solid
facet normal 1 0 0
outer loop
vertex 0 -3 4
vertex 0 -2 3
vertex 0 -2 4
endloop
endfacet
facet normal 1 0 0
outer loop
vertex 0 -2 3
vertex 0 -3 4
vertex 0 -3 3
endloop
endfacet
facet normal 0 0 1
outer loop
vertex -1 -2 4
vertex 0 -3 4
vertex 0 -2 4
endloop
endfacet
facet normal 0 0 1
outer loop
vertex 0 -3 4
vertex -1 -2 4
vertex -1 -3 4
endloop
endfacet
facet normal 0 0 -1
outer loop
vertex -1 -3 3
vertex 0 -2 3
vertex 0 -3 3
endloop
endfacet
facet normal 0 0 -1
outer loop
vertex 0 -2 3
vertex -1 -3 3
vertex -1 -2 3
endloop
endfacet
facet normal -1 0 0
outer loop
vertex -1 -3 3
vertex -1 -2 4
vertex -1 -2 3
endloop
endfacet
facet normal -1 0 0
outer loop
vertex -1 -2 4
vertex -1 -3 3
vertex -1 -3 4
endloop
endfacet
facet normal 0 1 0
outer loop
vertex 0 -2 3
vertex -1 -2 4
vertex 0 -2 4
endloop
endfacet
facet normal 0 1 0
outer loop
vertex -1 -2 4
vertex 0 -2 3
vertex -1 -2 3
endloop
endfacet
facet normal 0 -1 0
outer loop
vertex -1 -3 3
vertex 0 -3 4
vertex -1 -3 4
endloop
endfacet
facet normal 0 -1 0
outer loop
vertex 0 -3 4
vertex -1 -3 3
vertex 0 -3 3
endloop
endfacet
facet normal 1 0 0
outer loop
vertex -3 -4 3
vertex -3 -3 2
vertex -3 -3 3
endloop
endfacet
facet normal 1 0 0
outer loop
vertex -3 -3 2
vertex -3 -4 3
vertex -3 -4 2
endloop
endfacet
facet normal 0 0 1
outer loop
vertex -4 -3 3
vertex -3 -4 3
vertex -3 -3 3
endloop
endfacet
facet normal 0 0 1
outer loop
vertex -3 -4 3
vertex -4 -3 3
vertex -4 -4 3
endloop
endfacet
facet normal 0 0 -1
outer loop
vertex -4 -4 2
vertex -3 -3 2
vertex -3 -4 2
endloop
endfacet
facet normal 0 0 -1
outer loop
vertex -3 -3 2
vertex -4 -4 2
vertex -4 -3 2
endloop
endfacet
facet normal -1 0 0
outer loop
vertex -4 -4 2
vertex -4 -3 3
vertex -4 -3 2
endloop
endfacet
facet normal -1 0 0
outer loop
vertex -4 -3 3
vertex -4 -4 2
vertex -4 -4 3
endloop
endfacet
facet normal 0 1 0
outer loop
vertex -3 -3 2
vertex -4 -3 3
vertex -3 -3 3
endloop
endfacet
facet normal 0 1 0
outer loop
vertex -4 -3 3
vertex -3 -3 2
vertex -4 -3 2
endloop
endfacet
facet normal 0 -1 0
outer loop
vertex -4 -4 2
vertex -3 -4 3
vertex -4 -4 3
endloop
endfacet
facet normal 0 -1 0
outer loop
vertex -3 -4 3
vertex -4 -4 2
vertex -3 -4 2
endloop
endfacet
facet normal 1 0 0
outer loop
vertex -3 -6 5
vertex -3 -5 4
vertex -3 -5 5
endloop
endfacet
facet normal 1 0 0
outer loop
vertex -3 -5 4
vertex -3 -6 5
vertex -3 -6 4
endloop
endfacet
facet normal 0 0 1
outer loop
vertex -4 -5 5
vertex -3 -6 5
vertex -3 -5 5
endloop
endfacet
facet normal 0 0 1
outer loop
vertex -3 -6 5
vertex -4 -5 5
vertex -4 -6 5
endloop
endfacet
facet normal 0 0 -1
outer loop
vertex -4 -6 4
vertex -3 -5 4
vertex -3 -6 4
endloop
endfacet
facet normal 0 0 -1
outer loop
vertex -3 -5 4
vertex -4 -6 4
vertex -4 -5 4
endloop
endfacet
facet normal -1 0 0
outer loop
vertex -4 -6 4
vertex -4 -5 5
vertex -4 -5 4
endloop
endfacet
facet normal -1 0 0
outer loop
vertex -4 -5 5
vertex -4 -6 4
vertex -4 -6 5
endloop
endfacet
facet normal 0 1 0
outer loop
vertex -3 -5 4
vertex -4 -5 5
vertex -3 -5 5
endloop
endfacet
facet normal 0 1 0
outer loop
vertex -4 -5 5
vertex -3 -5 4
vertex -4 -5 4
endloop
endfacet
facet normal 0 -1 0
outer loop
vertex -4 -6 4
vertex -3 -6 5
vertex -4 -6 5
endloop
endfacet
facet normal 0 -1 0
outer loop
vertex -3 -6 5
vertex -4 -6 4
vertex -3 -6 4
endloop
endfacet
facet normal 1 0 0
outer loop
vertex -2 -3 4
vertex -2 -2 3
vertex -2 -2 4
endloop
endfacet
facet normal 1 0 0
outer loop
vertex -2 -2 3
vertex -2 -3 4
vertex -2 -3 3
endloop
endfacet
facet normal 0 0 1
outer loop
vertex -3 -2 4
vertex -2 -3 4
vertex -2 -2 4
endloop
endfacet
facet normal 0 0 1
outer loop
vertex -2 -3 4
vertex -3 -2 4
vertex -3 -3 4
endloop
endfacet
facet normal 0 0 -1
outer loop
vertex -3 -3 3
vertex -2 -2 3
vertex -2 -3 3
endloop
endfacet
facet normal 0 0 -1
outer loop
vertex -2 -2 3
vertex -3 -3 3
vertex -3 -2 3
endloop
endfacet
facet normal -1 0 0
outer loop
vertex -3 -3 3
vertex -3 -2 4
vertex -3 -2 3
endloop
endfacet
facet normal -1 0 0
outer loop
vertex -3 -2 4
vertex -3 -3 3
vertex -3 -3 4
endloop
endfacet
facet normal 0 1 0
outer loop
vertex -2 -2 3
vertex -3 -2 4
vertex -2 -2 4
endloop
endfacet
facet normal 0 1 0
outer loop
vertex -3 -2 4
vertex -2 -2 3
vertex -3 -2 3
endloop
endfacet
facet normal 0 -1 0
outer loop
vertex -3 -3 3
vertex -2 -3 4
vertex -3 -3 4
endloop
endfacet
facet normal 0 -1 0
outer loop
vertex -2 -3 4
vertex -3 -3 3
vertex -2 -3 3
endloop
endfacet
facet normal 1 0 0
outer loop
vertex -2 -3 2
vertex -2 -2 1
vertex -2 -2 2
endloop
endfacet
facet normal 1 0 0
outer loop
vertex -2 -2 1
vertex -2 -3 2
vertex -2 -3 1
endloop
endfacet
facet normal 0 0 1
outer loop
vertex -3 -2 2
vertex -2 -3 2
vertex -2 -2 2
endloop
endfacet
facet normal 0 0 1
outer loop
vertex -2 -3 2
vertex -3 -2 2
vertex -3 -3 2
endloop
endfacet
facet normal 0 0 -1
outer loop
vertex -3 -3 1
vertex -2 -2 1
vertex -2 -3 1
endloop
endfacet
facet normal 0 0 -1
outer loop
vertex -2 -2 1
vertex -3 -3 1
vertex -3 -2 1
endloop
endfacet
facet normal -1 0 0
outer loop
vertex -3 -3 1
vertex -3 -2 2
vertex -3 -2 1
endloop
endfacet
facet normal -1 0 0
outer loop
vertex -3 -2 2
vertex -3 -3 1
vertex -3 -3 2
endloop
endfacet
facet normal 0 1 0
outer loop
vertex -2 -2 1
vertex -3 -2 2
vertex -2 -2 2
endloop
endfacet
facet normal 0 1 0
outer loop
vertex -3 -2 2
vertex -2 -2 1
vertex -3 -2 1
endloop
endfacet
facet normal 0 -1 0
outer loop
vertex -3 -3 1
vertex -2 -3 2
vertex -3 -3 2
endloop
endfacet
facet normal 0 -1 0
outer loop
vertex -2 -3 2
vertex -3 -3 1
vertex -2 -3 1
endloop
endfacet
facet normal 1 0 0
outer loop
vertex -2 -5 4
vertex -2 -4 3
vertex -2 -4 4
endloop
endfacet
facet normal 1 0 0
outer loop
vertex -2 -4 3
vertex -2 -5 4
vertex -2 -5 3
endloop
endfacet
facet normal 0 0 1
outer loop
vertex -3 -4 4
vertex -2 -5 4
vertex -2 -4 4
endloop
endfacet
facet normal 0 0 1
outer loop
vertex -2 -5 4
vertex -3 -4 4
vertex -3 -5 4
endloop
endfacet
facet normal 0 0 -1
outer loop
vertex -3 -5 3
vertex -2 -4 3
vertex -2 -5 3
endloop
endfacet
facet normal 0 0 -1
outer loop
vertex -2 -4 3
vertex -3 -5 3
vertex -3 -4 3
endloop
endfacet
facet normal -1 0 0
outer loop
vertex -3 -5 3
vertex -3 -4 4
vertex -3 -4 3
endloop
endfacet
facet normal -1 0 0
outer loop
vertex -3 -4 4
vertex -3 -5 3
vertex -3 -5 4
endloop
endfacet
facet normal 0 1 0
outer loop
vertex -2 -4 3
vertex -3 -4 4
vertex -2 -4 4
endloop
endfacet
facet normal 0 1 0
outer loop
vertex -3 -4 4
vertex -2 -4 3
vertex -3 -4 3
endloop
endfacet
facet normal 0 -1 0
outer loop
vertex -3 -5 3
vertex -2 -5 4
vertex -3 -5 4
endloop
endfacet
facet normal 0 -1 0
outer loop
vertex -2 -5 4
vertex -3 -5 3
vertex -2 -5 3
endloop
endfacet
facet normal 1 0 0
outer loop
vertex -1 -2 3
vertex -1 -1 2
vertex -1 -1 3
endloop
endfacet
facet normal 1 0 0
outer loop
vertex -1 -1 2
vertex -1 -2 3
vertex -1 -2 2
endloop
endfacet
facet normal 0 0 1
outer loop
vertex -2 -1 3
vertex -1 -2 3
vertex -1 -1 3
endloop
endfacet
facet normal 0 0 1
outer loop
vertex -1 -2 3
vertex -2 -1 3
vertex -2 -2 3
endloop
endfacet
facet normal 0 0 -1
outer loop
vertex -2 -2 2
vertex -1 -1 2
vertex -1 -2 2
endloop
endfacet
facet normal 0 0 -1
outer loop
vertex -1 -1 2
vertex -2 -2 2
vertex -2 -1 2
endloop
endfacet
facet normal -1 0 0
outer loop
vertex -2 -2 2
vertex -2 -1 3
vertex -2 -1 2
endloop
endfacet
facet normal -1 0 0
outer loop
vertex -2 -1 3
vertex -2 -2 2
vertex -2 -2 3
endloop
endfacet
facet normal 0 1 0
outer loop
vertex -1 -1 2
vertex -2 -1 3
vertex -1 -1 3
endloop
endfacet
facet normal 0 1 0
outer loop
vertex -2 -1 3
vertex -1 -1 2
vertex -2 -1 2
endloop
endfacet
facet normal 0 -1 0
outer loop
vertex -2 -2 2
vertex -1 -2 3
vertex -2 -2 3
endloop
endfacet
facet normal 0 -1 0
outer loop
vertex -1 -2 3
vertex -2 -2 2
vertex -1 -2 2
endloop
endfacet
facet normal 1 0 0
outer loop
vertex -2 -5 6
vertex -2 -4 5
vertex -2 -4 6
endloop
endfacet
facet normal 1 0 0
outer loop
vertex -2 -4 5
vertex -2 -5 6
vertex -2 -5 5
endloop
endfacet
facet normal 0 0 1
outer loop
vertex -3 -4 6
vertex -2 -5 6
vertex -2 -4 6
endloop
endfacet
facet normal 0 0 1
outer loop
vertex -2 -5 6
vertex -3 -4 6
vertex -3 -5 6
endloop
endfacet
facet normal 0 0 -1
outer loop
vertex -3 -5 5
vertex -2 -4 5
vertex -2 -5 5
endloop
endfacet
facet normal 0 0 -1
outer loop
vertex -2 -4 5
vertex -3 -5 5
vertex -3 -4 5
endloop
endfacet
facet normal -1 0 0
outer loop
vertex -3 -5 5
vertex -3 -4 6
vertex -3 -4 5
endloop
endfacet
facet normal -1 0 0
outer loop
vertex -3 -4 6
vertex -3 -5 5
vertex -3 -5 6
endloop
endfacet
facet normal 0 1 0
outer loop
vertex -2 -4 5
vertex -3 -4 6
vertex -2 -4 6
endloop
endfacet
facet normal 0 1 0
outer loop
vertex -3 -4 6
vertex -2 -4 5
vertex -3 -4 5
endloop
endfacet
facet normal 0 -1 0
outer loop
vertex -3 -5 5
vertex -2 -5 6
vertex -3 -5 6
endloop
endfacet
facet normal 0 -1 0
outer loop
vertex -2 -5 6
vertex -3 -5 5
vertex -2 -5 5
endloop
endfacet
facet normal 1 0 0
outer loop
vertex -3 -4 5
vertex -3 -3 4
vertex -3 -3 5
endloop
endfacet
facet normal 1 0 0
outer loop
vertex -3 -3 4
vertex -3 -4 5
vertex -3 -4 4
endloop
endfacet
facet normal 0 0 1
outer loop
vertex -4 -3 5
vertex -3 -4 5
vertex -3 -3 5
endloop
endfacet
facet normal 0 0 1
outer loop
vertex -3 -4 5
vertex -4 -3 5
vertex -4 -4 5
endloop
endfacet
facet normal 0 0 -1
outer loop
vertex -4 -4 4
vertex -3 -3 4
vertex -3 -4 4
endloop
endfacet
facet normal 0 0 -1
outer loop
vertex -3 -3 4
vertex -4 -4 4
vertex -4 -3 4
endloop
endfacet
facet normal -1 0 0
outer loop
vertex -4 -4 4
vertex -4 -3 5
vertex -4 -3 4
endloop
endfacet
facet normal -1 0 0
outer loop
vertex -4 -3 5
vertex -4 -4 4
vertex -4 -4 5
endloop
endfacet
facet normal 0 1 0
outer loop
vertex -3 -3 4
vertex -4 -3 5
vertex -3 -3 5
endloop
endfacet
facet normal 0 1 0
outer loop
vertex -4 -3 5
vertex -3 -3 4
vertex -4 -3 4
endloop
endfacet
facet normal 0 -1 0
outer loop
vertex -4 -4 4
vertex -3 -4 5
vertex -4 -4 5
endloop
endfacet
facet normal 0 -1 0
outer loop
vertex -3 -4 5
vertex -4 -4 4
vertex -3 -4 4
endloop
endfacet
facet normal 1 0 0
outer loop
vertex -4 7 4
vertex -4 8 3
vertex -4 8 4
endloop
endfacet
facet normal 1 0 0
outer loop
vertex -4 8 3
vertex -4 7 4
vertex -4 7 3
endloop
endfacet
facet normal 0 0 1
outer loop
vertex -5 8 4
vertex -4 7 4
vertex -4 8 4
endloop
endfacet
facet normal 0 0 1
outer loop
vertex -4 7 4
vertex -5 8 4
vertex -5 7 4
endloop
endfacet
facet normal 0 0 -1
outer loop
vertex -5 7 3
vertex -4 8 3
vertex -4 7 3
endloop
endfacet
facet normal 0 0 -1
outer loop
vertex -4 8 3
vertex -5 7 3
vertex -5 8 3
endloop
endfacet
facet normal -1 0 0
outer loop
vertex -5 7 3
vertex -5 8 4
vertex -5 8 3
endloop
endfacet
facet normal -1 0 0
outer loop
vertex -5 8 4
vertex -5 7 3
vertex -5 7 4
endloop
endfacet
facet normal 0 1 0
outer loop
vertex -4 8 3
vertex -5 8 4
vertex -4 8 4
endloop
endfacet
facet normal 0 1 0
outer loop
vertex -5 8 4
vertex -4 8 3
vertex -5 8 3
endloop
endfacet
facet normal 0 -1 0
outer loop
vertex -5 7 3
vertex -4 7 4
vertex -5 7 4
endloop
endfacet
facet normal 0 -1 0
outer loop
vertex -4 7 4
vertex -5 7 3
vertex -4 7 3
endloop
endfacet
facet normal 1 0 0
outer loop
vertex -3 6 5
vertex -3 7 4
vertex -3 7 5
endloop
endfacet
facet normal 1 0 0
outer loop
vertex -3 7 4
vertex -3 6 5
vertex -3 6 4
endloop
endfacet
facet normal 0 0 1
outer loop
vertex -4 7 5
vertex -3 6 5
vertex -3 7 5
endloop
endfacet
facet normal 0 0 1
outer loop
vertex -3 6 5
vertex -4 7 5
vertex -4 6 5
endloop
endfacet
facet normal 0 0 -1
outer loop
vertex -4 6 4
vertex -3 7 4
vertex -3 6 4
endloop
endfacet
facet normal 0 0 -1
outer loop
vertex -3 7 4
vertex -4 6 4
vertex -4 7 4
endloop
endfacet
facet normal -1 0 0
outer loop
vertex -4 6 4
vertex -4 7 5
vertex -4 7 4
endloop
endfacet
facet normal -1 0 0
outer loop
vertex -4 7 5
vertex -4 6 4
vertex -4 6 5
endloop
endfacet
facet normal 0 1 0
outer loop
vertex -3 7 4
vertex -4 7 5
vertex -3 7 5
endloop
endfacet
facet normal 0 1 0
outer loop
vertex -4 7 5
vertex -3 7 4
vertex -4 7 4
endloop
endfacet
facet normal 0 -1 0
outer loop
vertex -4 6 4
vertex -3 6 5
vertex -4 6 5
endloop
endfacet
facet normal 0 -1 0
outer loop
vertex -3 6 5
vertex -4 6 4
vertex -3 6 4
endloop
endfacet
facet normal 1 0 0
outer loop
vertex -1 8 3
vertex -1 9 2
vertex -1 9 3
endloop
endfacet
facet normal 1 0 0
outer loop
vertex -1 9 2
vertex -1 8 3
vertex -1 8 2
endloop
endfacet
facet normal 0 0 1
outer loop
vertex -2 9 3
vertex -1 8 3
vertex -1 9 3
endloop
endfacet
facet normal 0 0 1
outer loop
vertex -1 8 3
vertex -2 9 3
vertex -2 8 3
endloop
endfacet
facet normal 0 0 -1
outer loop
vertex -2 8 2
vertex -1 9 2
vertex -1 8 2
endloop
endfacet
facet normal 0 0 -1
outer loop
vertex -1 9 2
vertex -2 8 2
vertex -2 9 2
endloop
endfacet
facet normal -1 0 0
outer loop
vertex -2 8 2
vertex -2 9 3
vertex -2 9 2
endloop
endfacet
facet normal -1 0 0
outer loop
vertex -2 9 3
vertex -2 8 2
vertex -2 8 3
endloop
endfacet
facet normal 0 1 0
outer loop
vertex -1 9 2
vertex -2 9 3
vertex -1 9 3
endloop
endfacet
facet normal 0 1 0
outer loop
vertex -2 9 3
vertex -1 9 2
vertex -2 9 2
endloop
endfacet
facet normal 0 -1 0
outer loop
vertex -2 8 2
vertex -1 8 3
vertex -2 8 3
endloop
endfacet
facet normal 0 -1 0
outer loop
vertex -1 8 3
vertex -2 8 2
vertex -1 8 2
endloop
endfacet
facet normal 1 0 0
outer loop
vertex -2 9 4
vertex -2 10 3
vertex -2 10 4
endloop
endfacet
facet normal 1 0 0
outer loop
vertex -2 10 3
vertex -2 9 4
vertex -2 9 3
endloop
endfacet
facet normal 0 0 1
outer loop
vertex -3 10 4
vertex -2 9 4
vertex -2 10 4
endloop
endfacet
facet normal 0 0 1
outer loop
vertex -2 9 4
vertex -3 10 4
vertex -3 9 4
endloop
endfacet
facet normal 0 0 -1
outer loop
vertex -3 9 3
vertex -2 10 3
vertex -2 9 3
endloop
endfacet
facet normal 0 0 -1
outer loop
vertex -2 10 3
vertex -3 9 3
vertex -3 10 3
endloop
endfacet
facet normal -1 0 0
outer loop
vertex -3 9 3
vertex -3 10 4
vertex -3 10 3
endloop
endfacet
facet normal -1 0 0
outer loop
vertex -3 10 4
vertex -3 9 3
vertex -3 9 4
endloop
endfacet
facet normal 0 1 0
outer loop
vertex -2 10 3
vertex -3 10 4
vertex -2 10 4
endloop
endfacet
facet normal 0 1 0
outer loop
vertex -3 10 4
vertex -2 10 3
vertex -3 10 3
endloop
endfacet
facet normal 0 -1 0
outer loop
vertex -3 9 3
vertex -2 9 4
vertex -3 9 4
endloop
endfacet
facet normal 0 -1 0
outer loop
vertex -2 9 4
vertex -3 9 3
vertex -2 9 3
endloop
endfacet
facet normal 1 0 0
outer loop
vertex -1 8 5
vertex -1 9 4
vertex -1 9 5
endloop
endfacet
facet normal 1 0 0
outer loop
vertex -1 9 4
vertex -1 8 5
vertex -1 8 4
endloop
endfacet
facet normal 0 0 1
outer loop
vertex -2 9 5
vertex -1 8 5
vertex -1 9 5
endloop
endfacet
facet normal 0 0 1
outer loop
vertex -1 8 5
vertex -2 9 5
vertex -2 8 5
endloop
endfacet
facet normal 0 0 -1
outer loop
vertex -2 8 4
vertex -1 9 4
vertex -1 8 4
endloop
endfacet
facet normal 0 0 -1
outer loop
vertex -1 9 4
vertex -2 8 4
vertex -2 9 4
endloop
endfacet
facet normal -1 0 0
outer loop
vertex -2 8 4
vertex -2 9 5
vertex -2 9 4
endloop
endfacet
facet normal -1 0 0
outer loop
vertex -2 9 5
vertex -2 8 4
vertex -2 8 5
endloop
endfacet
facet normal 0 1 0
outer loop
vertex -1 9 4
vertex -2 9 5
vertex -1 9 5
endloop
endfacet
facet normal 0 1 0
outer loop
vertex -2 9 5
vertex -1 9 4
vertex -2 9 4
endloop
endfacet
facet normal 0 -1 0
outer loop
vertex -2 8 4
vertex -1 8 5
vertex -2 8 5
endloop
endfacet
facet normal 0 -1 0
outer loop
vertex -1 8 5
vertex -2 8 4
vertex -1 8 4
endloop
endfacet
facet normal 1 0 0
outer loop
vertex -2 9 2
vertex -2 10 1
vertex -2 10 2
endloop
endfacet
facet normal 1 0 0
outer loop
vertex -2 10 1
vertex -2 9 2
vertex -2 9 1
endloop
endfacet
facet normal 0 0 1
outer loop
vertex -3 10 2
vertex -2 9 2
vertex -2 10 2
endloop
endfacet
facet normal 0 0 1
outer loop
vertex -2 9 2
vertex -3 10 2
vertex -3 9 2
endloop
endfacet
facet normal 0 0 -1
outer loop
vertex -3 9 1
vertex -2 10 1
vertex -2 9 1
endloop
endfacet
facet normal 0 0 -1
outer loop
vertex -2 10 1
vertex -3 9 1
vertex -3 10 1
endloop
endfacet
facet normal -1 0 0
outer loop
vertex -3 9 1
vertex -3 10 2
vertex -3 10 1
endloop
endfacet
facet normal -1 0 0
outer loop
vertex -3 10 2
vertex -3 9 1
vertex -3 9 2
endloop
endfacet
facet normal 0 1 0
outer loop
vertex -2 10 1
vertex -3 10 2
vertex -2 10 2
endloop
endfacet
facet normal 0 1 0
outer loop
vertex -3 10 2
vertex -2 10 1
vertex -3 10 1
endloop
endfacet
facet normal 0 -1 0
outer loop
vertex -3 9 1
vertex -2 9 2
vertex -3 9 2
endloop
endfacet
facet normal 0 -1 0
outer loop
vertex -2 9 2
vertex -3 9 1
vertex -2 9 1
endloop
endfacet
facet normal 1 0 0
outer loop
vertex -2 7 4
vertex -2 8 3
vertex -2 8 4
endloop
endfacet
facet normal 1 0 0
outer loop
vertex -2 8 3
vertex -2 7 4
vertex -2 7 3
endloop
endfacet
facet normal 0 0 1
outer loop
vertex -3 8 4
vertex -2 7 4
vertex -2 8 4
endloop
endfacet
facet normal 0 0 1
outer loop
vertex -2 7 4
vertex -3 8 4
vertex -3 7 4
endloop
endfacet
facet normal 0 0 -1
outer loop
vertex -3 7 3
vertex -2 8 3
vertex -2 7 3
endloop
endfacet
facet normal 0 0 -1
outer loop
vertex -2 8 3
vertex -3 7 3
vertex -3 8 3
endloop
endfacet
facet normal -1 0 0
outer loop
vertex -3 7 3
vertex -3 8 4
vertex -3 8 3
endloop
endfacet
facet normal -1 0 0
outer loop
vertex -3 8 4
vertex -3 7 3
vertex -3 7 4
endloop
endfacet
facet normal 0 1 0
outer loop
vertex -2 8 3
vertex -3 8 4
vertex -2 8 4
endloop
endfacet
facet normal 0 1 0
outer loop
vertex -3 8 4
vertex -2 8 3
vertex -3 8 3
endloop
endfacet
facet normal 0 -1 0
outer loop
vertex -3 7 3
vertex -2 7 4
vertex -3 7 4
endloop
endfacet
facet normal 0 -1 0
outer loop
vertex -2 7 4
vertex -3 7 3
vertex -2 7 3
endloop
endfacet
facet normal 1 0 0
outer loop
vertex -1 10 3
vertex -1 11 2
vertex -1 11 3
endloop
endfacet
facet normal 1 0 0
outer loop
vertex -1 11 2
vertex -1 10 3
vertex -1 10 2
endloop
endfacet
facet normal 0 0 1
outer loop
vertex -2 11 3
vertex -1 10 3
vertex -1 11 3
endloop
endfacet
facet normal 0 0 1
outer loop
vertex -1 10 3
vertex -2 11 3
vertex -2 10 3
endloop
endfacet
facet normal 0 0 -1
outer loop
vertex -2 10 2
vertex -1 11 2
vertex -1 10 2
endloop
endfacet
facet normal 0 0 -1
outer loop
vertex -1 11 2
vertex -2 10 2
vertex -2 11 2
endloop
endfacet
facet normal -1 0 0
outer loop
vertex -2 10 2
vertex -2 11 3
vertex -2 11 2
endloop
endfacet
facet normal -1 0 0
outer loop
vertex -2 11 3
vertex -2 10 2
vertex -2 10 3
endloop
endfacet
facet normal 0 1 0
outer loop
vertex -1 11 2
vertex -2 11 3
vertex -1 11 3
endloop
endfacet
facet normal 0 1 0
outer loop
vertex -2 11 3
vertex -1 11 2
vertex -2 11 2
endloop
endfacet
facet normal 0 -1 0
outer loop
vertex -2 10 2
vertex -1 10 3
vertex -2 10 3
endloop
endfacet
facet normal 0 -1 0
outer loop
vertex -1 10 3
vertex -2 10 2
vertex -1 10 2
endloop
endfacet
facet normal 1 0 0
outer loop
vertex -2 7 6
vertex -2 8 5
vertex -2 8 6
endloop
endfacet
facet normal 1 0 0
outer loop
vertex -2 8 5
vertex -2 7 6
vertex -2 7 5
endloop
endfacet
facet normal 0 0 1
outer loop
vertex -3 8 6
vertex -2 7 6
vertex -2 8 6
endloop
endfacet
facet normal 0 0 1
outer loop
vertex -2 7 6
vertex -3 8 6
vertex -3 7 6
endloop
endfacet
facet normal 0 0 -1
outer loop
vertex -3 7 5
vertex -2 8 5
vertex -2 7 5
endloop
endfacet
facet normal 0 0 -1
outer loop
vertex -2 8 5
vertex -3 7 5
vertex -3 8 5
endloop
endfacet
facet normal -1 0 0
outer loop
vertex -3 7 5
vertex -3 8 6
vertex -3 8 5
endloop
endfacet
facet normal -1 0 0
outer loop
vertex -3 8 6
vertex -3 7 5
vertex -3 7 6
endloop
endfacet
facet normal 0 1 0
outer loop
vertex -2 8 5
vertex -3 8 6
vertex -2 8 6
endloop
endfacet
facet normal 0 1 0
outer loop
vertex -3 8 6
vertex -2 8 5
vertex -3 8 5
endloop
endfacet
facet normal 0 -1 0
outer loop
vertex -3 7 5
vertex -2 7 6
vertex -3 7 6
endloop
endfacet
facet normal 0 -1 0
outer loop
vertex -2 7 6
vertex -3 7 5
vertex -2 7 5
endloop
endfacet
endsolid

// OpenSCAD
module step0 ()
{
  translate([-4, -10, -4]) {
    translate([3, 7, 7]) { cube(1); }
    translate([0, 6, 6]) { cube(1); }
    translate([0, 4, 8]) { cube(1); }
    translate([1, 7, 7]) { cube(1); }
    translate([1, 7, 5]) { cube(1); }
    translate([1, 5, 7]) { cube(1); }
    translate([2, 8, 6]) { cube(1); }
    translate([1, 5, 9]) { cube(1); }
    translate([0, 6, 8]) { cube(1); }
  }
}

module step1 ()
{
  translate([-4, 2, -4]) {
    translate([-1, 5, 7]) { cube(1); }
    translate([0, 4, 8]) { cube(1); }
    translate([2, 6, 6]) { cube(1); }
    translate([1, 7, 7]) { cube(1); }
    translate([2, 6, 8]) { cube(1); }
    translate([1, 7, 5]) { cube(1); }
    translate([1, 5, 7]) { cube(1); }
    translate([2, 8, 6]) { cube(1); }
    translate([1, 5, 9]) { cube(1); }
  }
}

step0();

step1();
